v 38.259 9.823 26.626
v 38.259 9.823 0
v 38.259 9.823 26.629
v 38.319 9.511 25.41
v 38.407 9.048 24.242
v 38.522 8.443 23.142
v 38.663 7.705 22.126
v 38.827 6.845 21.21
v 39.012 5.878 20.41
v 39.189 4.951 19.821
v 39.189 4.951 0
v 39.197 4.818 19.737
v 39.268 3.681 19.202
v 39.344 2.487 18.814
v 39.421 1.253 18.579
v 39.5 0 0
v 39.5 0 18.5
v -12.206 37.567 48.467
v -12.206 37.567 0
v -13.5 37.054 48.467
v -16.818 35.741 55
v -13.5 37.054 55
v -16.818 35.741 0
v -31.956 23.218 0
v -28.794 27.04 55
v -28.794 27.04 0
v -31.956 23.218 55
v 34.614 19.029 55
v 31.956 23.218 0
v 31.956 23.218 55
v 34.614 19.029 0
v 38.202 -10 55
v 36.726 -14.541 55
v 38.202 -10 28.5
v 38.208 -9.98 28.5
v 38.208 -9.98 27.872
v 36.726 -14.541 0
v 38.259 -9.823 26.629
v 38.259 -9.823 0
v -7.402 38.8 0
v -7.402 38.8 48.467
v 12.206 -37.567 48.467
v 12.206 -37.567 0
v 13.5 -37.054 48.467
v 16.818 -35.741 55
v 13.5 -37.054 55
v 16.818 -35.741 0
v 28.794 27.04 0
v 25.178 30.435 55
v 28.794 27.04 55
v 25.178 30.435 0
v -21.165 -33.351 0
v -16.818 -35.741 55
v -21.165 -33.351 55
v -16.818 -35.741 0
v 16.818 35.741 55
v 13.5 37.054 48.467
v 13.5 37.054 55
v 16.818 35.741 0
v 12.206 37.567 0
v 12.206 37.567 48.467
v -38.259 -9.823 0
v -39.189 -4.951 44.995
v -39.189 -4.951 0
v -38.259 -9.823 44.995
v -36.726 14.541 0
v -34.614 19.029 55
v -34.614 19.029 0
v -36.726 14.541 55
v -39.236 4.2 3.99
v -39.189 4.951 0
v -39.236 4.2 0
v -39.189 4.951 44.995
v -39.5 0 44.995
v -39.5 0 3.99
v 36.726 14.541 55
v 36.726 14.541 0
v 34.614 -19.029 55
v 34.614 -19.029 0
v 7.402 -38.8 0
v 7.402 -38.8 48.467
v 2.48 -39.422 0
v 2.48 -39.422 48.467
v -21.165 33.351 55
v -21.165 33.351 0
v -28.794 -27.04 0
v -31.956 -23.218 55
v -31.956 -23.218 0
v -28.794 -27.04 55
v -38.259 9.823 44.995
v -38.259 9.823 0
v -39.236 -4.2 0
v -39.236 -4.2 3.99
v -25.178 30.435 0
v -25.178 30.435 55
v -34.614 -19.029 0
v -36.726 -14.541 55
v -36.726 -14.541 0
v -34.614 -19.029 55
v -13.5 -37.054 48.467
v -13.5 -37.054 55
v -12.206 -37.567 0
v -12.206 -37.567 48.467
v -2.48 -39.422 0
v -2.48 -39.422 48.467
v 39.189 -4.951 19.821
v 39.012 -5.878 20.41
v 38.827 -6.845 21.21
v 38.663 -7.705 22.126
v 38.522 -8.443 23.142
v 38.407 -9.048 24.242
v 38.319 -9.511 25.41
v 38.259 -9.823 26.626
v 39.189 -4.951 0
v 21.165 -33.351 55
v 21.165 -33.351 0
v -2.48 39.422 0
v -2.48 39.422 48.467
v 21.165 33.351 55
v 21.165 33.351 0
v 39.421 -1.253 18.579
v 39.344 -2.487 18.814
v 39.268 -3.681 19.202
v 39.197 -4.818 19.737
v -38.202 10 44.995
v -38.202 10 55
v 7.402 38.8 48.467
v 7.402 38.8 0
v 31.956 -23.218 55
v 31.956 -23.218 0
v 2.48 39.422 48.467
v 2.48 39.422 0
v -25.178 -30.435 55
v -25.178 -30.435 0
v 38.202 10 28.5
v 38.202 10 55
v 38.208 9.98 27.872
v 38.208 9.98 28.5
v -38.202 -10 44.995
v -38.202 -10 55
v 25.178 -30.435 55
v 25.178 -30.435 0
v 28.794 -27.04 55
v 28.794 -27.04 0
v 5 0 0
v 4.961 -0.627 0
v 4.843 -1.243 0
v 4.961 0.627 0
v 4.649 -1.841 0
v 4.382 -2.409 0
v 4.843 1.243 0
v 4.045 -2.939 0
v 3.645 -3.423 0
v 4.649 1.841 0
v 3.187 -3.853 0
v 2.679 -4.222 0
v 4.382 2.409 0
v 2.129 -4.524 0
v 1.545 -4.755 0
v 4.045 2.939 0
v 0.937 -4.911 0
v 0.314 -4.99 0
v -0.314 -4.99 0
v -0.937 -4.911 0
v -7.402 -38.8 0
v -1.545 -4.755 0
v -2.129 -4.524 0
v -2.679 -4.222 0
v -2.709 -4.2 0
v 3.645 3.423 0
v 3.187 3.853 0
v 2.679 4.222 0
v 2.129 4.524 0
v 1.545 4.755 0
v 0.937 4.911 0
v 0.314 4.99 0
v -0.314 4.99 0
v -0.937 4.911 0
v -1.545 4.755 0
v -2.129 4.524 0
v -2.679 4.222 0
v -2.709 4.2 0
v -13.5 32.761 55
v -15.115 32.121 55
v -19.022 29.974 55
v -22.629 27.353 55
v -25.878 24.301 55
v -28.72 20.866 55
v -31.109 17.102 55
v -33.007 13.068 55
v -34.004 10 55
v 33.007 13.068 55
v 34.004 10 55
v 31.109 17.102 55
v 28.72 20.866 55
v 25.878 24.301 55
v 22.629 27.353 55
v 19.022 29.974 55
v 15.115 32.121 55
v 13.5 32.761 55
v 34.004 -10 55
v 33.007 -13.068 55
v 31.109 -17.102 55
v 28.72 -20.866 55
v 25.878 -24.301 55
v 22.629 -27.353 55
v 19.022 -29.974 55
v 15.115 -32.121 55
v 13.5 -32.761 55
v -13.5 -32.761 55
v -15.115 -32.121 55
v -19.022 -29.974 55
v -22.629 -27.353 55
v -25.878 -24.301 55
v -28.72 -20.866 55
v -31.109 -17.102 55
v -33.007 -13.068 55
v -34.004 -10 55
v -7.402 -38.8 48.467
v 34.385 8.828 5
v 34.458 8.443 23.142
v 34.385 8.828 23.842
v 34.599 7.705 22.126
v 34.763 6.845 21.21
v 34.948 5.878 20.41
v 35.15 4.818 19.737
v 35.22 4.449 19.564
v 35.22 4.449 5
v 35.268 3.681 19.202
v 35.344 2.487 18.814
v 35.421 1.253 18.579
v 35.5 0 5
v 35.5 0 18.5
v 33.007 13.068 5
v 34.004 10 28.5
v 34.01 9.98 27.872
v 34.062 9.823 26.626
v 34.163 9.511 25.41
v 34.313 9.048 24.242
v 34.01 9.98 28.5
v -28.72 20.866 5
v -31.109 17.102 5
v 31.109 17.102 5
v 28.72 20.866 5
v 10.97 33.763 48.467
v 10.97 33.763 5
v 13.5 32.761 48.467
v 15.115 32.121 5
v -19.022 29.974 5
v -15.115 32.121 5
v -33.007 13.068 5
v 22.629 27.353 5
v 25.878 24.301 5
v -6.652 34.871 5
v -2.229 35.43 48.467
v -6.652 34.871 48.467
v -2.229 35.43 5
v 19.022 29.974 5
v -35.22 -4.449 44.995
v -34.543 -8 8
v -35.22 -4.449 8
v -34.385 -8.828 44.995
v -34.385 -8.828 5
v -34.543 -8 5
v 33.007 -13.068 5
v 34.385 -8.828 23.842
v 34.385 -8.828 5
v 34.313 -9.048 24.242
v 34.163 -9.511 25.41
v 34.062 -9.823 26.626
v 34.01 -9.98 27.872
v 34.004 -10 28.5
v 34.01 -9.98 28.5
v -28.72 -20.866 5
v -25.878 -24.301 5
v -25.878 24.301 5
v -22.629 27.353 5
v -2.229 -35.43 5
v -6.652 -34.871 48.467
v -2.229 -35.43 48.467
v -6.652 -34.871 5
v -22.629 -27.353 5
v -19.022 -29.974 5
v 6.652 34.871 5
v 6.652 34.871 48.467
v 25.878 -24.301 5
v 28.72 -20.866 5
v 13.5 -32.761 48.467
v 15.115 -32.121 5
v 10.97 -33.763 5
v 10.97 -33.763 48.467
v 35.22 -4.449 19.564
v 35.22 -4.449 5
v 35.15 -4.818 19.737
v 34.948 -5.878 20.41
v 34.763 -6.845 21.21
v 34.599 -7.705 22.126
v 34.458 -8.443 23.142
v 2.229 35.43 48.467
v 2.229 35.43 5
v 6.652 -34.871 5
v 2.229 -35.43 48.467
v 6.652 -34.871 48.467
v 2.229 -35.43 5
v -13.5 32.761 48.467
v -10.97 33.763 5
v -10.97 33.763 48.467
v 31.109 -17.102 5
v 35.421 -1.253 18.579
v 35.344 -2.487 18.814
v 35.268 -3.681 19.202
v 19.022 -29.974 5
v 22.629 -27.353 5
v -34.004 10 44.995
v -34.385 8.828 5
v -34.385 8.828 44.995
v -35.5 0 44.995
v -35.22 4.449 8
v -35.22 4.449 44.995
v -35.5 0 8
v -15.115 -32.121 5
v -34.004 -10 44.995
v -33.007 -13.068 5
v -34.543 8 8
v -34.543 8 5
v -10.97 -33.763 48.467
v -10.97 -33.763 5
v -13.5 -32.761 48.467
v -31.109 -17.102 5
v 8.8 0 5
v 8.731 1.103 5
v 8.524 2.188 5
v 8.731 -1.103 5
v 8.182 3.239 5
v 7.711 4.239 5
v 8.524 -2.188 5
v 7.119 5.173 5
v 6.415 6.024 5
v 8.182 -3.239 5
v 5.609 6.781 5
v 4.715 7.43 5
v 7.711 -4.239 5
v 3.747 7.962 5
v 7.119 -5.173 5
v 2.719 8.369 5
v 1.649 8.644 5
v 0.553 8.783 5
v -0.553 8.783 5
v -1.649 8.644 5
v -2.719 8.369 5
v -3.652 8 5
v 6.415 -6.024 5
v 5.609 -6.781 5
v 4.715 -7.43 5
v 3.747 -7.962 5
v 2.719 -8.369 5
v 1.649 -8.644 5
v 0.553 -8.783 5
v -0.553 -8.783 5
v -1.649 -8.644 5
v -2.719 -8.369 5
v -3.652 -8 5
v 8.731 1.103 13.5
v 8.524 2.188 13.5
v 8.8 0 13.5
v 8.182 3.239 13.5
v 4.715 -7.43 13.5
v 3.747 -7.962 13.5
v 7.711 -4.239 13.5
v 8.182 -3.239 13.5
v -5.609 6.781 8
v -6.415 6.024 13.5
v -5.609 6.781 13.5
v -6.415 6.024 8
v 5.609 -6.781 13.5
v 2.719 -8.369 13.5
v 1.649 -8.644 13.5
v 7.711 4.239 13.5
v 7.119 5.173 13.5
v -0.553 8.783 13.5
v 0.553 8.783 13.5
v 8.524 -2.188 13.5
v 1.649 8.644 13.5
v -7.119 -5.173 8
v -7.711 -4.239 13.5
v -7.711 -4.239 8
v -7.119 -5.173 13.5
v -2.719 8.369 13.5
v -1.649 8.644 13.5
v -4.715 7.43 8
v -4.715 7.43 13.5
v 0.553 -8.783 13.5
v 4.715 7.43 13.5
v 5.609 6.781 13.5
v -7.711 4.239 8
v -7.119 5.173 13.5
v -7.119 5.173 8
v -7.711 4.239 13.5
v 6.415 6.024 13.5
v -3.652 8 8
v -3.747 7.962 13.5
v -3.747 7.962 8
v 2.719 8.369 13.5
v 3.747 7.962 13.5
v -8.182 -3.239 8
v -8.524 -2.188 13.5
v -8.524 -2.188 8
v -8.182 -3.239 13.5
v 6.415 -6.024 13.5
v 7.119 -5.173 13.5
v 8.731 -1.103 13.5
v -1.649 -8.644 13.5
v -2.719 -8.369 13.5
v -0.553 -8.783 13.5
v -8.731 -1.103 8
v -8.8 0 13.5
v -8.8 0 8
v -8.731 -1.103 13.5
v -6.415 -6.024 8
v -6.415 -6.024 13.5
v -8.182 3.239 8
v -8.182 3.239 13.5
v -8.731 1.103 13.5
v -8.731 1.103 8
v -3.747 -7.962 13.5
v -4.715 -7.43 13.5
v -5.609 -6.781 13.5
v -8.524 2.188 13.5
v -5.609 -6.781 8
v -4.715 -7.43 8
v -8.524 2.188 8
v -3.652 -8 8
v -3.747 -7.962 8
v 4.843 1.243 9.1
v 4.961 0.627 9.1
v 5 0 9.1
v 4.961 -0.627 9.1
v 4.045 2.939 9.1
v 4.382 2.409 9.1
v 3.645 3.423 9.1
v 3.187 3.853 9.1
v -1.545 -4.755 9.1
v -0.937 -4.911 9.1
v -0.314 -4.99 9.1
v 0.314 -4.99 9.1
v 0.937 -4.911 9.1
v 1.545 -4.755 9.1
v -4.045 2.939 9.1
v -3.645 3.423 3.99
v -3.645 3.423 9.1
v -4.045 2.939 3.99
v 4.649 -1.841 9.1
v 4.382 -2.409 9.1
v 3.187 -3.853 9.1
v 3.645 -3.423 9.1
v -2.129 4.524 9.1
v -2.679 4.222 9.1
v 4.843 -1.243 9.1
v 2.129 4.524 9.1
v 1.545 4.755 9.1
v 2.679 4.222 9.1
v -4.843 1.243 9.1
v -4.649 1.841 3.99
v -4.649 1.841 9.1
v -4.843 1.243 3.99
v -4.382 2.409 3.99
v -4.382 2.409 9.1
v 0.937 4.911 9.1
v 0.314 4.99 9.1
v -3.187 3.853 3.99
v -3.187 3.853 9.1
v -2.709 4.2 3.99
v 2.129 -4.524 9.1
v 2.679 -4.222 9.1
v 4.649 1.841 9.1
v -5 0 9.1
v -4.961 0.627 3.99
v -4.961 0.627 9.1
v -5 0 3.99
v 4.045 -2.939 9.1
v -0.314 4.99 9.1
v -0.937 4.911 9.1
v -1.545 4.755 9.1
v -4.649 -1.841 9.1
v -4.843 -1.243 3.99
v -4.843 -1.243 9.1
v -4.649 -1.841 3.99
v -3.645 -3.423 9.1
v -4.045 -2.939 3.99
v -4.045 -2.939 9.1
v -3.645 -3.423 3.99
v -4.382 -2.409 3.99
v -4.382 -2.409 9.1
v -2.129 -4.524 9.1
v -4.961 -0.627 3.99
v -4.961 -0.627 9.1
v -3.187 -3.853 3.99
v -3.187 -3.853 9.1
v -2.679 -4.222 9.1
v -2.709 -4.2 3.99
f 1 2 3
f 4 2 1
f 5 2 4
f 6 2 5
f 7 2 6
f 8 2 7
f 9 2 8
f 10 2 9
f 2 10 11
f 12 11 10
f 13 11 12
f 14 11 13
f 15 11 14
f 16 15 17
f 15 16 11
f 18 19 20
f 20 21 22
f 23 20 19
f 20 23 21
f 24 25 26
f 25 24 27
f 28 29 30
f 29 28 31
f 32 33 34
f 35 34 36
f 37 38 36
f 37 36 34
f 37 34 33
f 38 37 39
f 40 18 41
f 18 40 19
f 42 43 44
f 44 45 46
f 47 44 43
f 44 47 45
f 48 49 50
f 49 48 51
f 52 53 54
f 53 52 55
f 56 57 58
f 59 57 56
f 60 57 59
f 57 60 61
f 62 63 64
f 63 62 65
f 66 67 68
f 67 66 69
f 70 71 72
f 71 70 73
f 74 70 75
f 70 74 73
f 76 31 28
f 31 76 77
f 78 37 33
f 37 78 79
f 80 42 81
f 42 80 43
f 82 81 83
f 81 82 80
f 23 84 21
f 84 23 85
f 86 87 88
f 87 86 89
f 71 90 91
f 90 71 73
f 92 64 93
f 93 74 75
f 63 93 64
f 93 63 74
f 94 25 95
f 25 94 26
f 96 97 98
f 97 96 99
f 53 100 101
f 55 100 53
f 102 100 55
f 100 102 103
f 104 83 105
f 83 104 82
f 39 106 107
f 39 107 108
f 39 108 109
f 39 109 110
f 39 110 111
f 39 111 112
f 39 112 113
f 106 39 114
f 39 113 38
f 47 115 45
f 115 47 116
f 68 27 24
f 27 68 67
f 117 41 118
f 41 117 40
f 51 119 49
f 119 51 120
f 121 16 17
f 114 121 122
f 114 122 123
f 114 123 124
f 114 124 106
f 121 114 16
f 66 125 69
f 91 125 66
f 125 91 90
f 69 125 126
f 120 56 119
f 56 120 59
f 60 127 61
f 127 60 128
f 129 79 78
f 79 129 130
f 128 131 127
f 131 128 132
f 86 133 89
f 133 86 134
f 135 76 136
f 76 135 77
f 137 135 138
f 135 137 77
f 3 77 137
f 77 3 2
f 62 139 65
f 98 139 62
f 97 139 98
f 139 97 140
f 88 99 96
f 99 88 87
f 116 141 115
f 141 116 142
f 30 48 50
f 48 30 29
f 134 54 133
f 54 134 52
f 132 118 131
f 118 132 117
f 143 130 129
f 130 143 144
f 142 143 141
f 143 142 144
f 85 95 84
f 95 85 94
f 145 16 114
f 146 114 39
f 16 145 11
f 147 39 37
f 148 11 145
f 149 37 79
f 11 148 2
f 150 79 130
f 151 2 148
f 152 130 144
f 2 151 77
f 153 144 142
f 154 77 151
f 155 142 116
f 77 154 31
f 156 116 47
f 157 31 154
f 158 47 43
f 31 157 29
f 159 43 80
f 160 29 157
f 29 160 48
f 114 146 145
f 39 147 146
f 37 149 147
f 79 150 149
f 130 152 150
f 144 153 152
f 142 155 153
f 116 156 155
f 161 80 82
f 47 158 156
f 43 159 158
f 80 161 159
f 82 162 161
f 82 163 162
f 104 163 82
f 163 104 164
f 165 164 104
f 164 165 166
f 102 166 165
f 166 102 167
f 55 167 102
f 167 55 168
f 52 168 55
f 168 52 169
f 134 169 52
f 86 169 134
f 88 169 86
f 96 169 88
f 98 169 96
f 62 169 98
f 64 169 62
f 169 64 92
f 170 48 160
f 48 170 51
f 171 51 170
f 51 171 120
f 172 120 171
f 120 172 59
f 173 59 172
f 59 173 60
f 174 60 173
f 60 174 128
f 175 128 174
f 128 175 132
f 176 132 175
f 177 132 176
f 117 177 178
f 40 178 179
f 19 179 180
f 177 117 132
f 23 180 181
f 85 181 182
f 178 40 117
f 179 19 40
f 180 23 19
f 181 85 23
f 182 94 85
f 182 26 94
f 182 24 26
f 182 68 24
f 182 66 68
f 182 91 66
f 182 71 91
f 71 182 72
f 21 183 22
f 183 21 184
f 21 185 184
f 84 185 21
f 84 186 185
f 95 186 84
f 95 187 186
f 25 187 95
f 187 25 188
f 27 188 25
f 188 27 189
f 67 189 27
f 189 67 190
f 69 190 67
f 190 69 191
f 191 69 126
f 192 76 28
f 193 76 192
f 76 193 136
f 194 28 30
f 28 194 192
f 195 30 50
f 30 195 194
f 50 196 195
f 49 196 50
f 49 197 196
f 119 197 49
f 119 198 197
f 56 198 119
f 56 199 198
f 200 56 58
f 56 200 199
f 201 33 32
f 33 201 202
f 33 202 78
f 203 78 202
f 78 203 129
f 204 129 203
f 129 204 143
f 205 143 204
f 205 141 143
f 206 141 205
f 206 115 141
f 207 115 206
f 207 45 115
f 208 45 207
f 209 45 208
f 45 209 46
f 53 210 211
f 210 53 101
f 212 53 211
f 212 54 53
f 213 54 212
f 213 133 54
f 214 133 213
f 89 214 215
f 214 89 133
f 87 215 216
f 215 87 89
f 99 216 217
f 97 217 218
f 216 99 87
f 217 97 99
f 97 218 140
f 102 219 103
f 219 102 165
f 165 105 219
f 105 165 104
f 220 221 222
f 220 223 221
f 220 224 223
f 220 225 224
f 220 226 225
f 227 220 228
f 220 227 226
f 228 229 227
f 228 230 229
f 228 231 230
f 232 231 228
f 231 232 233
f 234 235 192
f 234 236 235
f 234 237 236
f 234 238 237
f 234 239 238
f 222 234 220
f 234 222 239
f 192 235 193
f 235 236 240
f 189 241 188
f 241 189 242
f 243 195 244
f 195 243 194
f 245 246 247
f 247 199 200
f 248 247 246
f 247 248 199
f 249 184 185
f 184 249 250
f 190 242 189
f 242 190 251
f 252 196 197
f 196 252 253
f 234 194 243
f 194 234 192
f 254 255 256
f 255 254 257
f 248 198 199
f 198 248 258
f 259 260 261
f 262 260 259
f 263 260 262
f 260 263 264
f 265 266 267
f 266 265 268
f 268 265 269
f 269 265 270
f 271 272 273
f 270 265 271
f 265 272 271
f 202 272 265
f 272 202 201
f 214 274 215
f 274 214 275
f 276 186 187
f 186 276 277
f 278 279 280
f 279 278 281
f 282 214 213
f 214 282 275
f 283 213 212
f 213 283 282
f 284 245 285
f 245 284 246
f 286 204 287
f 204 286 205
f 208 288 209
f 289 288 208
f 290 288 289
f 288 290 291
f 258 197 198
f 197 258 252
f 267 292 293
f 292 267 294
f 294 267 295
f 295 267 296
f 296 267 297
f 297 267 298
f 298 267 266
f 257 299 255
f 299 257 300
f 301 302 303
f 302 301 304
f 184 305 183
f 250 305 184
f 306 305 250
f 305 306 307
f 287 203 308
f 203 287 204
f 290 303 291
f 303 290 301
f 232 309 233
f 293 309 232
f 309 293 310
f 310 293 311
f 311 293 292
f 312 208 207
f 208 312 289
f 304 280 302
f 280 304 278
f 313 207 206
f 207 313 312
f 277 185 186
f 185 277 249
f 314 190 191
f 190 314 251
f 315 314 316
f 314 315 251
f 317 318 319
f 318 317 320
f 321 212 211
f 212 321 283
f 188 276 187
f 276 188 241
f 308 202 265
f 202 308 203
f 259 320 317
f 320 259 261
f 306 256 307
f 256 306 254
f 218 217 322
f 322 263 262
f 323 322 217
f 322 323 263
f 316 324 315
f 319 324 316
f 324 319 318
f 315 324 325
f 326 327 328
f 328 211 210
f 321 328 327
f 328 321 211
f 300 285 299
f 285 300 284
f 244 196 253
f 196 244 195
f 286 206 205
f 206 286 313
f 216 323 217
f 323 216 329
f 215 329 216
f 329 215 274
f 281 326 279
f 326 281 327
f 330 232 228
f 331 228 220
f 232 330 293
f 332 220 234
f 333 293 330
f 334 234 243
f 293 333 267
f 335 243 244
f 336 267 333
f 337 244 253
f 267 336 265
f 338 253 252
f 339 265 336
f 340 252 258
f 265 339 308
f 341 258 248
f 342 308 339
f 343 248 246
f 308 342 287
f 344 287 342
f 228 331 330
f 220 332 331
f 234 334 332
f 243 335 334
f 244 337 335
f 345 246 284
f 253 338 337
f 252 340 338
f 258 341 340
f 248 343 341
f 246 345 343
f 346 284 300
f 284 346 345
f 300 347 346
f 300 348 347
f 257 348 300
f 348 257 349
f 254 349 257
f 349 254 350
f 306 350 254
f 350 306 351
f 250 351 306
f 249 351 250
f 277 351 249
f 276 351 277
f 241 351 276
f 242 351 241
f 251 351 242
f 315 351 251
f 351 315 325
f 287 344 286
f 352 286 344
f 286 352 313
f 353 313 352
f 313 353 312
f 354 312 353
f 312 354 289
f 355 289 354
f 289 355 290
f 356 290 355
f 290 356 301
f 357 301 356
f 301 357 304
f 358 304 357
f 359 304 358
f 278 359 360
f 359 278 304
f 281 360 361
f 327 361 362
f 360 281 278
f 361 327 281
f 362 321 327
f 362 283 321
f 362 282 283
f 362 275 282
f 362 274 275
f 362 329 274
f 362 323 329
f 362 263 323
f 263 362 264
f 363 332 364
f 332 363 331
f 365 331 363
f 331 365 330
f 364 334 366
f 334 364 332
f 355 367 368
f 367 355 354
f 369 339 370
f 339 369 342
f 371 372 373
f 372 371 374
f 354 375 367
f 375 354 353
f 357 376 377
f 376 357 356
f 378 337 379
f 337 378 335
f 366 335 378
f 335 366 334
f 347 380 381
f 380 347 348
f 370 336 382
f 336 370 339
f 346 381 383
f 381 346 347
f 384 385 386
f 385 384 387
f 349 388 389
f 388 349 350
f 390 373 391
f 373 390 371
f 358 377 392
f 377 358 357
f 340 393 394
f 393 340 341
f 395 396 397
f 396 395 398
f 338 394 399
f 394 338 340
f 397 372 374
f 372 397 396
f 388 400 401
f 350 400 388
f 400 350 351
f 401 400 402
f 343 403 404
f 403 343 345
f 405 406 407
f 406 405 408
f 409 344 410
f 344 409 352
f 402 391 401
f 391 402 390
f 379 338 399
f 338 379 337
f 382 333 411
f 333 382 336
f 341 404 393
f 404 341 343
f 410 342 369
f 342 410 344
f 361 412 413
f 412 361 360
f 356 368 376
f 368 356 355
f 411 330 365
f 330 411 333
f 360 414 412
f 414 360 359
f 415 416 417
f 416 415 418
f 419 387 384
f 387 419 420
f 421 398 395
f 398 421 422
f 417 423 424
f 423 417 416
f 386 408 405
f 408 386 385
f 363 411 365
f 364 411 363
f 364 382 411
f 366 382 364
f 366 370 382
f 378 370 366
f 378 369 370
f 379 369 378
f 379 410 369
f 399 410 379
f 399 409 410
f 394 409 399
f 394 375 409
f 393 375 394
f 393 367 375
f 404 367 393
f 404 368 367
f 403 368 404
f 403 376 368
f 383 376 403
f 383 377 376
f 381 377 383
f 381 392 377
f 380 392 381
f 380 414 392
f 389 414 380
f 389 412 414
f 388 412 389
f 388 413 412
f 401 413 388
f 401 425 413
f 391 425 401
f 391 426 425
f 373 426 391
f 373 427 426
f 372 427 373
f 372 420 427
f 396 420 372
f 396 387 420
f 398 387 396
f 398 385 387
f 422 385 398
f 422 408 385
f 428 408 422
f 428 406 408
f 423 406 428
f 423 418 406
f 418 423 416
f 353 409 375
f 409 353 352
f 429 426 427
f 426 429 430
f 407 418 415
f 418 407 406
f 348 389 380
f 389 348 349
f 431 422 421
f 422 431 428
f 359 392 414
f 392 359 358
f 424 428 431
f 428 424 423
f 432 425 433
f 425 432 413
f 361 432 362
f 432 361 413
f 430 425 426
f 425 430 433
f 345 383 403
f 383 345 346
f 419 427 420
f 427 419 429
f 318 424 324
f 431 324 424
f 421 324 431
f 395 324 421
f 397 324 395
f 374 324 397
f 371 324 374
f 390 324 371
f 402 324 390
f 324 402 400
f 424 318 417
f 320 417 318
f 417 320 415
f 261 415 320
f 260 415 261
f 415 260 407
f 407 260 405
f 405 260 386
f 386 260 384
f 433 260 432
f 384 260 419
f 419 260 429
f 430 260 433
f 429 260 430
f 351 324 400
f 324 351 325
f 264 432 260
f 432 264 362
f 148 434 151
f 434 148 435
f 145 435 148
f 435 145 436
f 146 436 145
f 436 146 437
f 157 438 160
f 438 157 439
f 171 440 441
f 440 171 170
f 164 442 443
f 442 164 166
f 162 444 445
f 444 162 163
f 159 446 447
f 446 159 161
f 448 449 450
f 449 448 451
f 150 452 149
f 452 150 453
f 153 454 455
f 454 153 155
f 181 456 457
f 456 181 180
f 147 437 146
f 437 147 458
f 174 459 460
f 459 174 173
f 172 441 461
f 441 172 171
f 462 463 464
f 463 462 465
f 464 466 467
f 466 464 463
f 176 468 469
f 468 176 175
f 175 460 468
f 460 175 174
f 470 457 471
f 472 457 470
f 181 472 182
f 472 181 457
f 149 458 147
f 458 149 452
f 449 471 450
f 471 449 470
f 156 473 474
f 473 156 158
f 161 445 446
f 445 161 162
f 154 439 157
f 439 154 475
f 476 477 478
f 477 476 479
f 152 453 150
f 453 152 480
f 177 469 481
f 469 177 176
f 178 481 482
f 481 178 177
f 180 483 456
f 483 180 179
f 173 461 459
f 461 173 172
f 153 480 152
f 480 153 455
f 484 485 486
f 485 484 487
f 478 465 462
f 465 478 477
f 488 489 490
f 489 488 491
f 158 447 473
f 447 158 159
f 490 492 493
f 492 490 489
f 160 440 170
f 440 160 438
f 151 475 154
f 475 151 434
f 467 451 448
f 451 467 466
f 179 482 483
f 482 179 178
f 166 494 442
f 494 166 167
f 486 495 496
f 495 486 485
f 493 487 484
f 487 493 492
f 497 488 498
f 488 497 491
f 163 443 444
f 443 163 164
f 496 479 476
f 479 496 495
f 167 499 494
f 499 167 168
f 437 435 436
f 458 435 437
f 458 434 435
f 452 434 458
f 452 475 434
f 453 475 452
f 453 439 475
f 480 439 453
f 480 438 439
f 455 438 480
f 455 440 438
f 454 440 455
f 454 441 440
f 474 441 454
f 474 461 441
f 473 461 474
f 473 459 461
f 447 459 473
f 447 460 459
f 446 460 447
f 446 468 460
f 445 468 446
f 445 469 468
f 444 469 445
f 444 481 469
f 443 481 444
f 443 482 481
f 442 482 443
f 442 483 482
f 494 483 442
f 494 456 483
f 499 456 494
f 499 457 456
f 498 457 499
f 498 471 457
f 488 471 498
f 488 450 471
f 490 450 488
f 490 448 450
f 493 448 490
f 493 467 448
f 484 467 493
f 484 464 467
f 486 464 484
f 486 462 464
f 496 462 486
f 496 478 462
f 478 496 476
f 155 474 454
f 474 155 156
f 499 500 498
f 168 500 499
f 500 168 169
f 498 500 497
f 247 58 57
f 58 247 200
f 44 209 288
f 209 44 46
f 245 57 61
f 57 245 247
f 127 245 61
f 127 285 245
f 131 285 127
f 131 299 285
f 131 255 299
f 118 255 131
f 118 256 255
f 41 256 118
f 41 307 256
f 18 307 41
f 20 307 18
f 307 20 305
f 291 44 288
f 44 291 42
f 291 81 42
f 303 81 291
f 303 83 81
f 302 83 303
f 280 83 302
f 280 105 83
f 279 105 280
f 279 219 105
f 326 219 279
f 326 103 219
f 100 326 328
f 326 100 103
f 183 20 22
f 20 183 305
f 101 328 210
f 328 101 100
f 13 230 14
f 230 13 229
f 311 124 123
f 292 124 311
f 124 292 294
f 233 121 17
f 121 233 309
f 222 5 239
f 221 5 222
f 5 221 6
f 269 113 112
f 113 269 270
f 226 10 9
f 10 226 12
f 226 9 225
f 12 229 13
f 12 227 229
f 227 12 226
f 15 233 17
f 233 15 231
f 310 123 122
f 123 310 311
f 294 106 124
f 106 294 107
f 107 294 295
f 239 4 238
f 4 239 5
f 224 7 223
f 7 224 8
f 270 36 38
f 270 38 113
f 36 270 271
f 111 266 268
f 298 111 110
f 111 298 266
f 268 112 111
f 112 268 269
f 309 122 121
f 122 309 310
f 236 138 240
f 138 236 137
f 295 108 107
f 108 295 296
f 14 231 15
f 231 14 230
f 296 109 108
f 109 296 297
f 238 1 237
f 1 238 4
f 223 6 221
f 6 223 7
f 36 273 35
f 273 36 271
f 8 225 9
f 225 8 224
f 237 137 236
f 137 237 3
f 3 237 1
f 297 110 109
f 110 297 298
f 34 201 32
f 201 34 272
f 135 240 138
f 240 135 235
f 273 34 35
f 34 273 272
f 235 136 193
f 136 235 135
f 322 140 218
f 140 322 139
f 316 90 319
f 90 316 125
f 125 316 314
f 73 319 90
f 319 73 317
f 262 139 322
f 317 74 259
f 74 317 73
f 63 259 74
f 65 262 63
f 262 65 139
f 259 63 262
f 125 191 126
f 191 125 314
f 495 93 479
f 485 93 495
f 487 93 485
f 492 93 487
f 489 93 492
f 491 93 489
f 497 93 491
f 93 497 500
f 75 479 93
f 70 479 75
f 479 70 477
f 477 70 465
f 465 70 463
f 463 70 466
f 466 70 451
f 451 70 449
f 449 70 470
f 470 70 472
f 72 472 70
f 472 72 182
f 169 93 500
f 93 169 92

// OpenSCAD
$fn=50*1;

// PF Stand Height
H=55;

// PF Stand Outer Diameter
OD=79;

// PF Stand Inner Diameter
ID=71;

// PF Stand Bottom Thickness;
BH=5;

// PF Handle Width;
HANDLEW=20;

// PF Handle Height (from bottom of stand)
HANDLEH=18.5;

// Lug Thickness
LUGTH=6.5;

// Lug Length
LUGL=27;

// Bottom Hole Diameter
HOLED=10;

// Bottom Hole Height
HOLEH=9.1;

// Bottom Hole Offset
HOLEOFF=-0;
// HOLEOFF=-5;

// Hole Cap Diameter
CAPD=17.6;

// Hole Cap Height
CAPH=13.5;

// Channel Width
CHANNELW=8;

// Channel Length
CHANNELL=OD/2;

// Channel Height
CHANNELH=4;

// Channel Wall Thickness
CHANNELTH=4;


// Model Selection, 1 = stand, 2 = channel guide
SELECT=1;


module base() {
    difference () {
        cylinder(d=OD, h=H);
        translate([0,0,BH])
            cylinder(d=ID, h=H);
    }
    
    // Center cap
    translate([HOLEOFF,0,0]) cylinder(d=CAPD, h=CAPH);
    
    // Channel Cap
    translate([-OD/2 + CHANNELW/2 + CHANNELTH ,0,0]) 
        cylinder(d=CHANNELW+CHANNELTH*2, h=CHANNELH+CHANNELTH);
    translate([-OD/2 - 1 + CHANNELW/2, -CHANNELW/2 - CHANNELTH, 0])
        cube(size=[OD/2, CHANNELW+CHANNELTH*2, CHANNELH+CHANNELTH]);
}


if ( SELECT == 1) {
difference () {
    base();
    
    // Center hole
    translate([HOLEOFF,0,-1]) cylinder(d=HOLED, h=HOLEH+1);
    
    // Lug holes
    translate([0,0,H-LUGTH*0.5])
        cube(size=[LUGL, OD, LUGTH*1.01], center=true);
    
    // PF handle hole
    translate([0,0,HANDLEH+HANDLEW/2])
        rotate([0,90,0])
        cylinder(d=HANDLEW, h=H);
    rotate([0,0,-90])
        translate([-HANDLEW/2,0,HANDLEH+HANDLEW/2])
        cube([HANDLEW,H,H]);
    
    // Opposite Funnel Hole
    translate([-OD/2,0,H-5])
        rotate([0,0,-90])
        cube([HANDLEW,OD,10.01], center=true);
        
    // Channel Hole
    translate([-OD/2, -CHANNELW/2-0.2, -0.01])
        cube(size=[OD/2, CHANNELW+0.4, CHANNELH]);     
}
} else if ( SELECT == 2 ) {
    translate([-CHANNELL/2, -0.2, 0])
        cylinder(d=CHANNELW-0.4, h=CHANNELH-1);
    difference () {
        translate([-CHANNELL/2, -CHANNELW/2, 0])
            cube(size=[CHANNELL/2, CHANNELW-0.4, CHANNELH-1]);     
        translate([HOLEOFF,0,-0.01]) cylinder(d=HOLED-0.4, h=HOLEH);
    }
    difference () {
        translate([HOLEOFF,0,0]) cylinder(d=HOLED-0.4, h=1);
        translate([0,0,-1]) cylinder(d=5, h=3);
        translate([-CHANNELL/2,CHANNELW/2-0.4,-0.01])
            cube([CHANNELL,CHANNELW,CHANNELH]);
        translate([-CHANNELL/2,-CHANNELW*1.5,-0.01])
            cube([CHANNELL,CHANNELW,CHANNELH]);
    }
}
